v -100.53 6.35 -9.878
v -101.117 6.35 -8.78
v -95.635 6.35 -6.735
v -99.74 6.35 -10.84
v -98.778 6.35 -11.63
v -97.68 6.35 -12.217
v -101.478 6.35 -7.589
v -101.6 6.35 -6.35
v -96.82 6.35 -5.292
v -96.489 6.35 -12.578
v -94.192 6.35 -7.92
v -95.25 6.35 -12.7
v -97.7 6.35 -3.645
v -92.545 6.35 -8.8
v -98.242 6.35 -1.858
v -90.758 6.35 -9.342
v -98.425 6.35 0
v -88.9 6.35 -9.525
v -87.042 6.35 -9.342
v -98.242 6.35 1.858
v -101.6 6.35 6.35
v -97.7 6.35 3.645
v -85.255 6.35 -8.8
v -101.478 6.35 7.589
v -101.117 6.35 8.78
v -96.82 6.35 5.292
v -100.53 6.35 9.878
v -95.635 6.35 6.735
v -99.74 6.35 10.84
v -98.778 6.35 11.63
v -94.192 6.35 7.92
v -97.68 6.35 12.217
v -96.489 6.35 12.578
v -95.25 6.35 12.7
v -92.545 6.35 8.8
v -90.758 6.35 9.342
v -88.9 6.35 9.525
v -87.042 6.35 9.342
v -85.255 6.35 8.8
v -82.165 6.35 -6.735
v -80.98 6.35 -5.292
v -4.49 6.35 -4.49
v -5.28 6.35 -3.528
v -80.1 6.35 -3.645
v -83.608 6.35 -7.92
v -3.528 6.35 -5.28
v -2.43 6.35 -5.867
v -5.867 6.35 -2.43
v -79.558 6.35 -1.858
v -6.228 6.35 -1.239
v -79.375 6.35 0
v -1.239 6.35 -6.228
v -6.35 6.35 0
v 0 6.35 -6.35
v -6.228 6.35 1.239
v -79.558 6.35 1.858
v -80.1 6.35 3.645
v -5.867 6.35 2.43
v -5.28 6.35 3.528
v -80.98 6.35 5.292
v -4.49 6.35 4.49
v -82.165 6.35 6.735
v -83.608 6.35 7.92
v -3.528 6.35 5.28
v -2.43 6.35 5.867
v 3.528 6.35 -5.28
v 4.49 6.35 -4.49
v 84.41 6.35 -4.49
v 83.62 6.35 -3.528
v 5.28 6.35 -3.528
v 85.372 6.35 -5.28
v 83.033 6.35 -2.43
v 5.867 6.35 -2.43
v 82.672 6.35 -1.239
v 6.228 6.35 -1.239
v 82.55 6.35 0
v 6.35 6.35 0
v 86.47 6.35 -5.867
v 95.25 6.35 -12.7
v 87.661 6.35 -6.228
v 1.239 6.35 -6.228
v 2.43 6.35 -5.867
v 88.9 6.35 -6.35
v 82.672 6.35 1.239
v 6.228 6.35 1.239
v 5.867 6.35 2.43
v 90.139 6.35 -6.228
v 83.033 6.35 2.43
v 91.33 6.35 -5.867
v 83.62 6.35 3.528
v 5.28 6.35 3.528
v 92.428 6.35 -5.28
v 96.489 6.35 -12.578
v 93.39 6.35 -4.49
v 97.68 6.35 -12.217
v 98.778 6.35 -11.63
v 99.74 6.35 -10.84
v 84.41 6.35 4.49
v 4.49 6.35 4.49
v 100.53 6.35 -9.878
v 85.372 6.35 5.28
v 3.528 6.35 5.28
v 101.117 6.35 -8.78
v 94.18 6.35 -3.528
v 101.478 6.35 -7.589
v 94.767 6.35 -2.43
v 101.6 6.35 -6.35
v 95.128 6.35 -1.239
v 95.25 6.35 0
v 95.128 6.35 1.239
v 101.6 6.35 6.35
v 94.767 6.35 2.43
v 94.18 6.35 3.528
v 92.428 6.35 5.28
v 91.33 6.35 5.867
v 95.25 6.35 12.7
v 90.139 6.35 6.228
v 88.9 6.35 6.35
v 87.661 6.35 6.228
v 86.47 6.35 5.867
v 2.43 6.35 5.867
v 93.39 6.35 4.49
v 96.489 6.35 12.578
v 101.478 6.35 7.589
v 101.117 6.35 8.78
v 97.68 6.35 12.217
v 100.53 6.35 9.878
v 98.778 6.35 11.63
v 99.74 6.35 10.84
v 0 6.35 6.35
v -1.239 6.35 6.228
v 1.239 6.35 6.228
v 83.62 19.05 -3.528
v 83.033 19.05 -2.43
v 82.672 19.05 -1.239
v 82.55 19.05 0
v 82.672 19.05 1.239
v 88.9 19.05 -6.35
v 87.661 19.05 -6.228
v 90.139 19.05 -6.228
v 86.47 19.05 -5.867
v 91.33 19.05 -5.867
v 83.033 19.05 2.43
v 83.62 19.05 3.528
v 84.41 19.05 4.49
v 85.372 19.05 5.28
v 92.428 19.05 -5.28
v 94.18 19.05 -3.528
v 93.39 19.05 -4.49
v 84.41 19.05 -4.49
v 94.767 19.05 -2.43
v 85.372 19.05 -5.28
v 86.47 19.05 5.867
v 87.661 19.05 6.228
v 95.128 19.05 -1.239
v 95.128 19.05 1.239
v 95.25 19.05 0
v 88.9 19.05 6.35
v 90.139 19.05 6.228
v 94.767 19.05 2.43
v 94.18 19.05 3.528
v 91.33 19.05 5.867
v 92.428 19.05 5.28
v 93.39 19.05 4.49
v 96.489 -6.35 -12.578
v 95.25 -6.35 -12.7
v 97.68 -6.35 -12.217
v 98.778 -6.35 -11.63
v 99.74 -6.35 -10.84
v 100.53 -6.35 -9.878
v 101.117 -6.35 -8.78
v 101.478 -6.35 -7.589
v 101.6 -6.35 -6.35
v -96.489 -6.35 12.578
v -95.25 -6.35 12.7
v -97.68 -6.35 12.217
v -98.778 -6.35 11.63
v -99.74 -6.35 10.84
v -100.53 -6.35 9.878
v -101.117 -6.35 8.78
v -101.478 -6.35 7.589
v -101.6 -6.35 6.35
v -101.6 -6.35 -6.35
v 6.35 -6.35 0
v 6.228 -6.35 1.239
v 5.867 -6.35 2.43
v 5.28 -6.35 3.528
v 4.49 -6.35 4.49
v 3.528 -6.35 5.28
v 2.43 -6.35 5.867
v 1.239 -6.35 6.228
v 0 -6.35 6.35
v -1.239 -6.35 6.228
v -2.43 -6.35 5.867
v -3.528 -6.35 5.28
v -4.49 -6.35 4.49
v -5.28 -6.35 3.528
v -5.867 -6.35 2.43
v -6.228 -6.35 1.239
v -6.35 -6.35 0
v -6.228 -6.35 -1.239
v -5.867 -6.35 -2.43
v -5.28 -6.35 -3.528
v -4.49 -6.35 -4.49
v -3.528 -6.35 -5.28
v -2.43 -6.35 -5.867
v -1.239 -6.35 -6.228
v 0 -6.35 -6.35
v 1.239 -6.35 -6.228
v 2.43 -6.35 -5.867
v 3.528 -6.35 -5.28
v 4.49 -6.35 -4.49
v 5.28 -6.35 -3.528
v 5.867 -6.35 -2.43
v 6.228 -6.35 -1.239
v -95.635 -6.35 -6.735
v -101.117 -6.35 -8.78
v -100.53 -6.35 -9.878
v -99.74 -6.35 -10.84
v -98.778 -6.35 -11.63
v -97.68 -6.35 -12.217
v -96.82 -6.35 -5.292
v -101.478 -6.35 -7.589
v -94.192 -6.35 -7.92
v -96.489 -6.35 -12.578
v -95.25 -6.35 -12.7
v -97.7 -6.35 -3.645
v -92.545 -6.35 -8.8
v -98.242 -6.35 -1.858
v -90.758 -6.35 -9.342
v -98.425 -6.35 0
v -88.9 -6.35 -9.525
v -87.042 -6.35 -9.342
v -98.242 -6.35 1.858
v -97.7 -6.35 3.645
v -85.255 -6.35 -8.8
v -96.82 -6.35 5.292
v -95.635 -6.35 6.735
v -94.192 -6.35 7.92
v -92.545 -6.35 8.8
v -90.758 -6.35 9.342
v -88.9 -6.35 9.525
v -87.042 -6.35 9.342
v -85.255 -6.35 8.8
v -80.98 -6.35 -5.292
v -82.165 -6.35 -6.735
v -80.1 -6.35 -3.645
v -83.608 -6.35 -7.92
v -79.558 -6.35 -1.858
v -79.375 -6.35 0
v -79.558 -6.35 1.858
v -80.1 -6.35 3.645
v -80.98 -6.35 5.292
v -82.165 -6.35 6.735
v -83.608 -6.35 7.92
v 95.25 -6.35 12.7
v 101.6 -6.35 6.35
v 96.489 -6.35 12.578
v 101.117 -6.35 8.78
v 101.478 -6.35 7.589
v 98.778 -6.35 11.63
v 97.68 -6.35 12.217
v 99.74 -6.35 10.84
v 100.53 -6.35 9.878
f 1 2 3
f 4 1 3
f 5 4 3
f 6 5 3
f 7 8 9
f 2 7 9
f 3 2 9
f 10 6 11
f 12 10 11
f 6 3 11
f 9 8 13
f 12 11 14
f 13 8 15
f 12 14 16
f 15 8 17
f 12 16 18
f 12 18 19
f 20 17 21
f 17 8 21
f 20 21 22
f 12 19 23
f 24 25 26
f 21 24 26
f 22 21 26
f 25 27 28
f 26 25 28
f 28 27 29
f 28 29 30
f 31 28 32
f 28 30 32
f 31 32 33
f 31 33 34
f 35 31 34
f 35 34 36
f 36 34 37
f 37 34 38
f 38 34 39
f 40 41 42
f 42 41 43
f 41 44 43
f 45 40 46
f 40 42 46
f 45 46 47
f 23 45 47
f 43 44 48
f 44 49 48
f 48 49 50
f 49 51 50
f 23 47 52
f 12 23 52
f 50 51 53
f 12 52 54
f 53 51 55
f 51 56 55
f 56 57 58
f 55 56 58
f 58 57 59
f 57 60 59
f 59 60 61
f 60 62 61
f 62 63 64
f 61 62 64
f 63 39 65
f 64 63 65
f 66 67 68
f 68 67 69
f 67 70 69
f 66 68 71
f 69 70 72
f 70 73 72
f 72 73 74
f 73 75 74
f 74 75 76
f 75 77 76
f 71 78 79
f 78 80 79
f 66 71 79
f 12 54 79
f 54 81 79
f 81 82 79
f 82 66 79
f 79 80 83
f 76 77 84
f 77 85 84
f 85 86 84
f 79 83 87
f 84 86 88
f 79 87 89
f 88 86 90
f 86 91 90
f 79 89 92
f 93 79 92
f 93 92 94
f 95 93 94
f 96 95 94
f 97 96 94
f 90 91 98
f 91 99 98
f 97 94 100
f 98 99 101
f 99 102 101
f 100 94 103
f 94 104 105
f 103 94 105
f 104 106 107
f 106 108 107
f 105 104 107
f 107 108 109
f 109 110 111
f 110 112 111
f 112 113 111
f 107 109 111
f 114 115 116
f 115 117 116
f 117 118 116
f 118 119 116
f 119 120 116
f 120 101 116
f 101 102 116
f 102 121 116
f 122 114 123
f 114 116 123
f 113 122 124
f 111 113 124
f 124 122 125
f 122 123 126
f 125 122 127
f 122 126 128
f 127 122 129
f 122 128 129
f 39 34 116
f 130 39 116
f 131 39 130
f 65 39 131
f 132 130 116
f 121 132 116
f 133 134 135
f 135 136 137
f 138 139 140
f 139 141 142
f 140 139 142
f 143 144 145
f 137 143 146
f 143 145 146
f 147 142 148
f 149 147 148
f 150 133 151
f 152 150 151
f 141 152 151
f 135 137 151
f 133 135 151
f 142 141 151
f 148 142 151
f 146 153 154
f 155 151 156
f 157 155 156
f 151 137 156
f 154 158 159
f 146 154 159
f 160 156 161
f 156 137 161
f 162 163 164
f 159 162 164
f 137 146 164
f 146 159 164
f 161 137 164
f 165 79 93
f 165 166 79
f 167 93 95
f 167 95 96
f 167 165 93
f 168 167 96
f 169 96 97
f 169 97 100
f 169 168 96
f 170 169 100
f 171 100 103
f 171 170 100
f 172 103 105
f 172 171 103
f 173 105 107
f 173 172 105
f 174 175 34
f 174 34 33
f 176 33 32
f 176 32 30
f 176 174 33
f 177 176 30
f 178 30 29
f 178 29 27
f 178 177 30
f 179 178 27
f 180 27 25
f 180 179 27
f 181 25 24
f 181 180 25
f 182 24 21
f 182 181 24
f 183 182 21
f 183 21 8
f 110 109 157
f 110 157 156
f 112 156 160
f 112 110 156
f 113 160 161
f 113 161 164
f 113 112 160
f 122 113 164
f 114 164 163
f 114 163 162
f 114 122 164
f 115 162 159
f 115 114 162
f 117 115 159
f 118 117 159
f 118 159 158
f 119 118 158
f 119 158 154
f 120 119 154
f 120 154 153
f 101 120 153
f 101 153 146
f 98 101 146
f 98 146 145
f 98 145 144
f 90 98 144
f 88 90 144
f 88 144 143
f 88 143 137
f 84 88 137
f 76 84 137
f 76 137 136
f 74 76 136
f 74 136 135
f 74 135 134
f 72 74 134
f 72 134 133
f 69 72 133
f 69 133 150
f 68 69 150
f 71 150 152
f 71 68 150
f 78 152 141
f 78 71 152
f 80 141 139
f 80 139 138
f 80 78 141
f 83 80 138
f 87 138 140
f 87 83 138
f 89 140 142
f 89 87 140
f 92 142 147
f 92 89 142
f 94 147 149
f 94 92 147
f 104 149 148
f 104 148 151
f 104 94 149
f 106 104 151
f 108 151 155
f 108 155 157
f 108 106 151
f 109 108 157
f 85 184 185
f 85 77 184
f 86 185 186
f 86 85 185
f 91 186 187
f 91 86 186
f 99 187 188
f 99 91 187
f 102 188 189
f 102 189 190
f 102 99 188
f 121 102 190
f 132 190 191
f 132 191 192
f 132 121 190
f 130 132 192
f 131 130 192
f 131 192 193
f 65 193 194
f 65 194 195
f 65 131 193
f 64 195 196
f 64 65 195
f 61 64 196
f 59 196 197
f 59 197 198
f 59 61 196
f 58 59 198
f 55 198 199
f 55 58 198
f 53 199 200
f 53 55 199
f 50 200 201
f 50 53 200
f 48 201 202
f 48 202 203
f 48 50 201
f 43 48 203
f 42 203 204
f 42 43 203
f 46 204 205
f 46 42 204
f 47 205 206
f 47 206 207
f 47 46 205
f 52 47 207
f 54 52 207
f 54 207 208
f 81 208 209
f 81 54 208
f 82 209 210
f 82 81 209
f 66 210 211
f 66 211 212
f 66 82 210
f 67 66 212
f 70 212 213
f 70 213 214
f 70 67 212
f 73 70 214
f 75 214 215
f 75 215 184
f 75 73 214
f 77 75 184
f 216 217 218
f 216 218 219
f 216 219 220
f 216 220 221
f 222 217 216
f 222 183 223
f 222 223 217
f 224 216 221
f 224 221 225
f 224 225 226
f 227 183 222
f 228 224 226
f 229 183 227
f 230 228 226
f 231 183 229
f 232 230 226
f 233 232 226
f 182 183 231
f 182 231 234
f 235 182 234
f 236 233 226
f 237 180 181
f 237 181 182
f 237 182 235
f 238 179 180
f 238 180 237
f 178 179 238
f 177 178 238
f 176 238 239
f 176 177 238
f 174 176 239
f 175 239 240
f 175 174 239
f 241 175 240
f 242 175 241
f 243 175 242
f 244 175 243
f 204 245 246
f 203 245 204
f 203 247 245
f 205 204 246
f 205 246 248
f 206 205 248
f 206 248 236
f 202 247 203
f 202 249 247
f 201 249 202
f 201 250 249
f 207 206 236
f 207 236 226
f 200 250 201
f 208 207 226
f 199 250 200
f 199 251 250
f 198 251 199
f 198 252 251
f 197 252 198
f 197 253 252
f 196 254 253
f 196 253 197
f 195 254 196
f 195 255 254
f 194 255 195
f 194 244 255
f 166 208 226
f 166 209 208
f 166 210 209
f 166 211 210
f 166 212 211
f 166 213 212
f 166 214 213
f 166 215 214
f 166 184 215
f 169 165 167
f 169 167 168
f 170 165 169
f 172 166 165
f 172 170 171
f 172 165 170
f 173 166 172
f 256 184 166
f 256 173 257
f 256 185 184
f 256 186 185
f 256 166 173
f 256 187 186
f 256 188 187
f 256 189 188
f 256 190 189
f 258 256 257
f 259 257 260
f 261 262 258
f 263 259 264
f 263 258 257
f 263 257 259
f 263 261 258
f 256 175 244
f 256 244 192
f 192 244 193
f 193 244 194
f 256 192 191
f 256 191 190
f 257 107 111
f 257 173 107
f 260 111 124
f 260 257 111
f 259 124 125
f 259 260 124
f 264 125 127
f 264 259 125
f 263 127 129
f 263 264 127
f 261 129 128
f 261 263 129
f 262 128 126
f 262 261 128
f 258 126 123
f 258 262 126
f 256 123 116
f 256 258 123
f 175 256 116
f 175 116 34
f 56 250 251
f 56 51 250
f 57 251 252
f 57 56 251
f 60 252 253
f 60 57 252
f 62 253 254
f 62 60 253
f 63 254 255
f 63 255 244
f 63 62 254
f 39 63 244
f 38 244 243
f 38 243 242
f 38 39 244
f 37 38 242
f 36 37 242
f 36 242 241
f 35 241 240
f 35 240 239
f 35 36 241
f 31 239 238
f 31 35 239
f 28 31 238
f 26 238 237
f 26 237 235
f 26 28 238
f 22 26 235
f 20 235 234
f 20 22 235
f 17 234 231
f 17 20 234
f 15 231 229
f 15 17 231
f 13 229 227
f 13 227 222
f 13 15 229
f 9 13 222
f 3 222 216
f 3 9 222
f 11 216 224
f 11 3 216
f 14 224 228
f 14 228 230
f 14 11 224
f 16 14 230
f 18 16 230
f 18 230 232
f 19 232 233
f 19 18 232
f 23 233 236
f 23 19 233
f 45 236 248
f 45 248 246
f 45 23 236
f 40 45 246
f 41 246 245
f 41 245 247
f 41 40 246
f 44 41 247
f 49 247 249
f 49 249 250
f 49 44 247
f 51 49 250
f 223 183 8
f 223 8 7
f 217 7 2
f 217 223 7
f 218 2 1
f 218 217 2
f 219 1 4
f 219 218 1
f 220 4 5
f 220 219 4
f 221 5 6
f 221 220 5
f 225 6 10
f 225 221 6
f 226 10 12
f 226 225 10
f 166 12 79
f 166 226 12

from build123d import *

# Parameters (mm, degrees)
F0_R     = 9.525
F0_R_2   = 6.35
F1_DEPTH = 6.35
F2_R     = 6.35
F3_DEPTH = 25.4


with BuildPart() as f1:
    # F0 (on Front) → F1 (new body, symmetric)
    with BuildSketch(Plane.XZ):
        with BuildLine():
            ThreePointArc((101.6, 6.35), (99.740128, 10.840128), (95.25, 12.7))
            Line((95.25, 12.7), (-95.25, 12.7))
            ThreePointArc((-95.25, 12.7), (-99.740128, 10.840128), (-101.6, 6.35))
            Line((-101.6, 6.35), (-101.6, -6.35))
            ThreePointArc((-101.6, -6.35), (-99.740128, -10.840128), (-95.25, -12.7))
            Line((-95.25, -12.7), (95.25, -12.7))
            ThreePointArc((95.25, -12.7), (99.740128, -10.840128), (101.6, -6.35))
            Line((101.6, -6.35), (101.6, 6.35))
        make_face()
        with Locations((-88.9, 0)):
            Circle(F0_R, mode=Mode.SUBTRACT)
        Circle(F0_R_2, mode=Mode.SUBTRACT)
    extrude(amount=F1_DEPTH, both=True)

    # F2 (on face) → F3 (join)
    with BuildSketch(Plane.XZ.offset(6.35)):
        with Locations((88.9, 0)):
            Circle(F2_R)
    extrude(amount=-F3_DEPTH)


solid = f1.part
